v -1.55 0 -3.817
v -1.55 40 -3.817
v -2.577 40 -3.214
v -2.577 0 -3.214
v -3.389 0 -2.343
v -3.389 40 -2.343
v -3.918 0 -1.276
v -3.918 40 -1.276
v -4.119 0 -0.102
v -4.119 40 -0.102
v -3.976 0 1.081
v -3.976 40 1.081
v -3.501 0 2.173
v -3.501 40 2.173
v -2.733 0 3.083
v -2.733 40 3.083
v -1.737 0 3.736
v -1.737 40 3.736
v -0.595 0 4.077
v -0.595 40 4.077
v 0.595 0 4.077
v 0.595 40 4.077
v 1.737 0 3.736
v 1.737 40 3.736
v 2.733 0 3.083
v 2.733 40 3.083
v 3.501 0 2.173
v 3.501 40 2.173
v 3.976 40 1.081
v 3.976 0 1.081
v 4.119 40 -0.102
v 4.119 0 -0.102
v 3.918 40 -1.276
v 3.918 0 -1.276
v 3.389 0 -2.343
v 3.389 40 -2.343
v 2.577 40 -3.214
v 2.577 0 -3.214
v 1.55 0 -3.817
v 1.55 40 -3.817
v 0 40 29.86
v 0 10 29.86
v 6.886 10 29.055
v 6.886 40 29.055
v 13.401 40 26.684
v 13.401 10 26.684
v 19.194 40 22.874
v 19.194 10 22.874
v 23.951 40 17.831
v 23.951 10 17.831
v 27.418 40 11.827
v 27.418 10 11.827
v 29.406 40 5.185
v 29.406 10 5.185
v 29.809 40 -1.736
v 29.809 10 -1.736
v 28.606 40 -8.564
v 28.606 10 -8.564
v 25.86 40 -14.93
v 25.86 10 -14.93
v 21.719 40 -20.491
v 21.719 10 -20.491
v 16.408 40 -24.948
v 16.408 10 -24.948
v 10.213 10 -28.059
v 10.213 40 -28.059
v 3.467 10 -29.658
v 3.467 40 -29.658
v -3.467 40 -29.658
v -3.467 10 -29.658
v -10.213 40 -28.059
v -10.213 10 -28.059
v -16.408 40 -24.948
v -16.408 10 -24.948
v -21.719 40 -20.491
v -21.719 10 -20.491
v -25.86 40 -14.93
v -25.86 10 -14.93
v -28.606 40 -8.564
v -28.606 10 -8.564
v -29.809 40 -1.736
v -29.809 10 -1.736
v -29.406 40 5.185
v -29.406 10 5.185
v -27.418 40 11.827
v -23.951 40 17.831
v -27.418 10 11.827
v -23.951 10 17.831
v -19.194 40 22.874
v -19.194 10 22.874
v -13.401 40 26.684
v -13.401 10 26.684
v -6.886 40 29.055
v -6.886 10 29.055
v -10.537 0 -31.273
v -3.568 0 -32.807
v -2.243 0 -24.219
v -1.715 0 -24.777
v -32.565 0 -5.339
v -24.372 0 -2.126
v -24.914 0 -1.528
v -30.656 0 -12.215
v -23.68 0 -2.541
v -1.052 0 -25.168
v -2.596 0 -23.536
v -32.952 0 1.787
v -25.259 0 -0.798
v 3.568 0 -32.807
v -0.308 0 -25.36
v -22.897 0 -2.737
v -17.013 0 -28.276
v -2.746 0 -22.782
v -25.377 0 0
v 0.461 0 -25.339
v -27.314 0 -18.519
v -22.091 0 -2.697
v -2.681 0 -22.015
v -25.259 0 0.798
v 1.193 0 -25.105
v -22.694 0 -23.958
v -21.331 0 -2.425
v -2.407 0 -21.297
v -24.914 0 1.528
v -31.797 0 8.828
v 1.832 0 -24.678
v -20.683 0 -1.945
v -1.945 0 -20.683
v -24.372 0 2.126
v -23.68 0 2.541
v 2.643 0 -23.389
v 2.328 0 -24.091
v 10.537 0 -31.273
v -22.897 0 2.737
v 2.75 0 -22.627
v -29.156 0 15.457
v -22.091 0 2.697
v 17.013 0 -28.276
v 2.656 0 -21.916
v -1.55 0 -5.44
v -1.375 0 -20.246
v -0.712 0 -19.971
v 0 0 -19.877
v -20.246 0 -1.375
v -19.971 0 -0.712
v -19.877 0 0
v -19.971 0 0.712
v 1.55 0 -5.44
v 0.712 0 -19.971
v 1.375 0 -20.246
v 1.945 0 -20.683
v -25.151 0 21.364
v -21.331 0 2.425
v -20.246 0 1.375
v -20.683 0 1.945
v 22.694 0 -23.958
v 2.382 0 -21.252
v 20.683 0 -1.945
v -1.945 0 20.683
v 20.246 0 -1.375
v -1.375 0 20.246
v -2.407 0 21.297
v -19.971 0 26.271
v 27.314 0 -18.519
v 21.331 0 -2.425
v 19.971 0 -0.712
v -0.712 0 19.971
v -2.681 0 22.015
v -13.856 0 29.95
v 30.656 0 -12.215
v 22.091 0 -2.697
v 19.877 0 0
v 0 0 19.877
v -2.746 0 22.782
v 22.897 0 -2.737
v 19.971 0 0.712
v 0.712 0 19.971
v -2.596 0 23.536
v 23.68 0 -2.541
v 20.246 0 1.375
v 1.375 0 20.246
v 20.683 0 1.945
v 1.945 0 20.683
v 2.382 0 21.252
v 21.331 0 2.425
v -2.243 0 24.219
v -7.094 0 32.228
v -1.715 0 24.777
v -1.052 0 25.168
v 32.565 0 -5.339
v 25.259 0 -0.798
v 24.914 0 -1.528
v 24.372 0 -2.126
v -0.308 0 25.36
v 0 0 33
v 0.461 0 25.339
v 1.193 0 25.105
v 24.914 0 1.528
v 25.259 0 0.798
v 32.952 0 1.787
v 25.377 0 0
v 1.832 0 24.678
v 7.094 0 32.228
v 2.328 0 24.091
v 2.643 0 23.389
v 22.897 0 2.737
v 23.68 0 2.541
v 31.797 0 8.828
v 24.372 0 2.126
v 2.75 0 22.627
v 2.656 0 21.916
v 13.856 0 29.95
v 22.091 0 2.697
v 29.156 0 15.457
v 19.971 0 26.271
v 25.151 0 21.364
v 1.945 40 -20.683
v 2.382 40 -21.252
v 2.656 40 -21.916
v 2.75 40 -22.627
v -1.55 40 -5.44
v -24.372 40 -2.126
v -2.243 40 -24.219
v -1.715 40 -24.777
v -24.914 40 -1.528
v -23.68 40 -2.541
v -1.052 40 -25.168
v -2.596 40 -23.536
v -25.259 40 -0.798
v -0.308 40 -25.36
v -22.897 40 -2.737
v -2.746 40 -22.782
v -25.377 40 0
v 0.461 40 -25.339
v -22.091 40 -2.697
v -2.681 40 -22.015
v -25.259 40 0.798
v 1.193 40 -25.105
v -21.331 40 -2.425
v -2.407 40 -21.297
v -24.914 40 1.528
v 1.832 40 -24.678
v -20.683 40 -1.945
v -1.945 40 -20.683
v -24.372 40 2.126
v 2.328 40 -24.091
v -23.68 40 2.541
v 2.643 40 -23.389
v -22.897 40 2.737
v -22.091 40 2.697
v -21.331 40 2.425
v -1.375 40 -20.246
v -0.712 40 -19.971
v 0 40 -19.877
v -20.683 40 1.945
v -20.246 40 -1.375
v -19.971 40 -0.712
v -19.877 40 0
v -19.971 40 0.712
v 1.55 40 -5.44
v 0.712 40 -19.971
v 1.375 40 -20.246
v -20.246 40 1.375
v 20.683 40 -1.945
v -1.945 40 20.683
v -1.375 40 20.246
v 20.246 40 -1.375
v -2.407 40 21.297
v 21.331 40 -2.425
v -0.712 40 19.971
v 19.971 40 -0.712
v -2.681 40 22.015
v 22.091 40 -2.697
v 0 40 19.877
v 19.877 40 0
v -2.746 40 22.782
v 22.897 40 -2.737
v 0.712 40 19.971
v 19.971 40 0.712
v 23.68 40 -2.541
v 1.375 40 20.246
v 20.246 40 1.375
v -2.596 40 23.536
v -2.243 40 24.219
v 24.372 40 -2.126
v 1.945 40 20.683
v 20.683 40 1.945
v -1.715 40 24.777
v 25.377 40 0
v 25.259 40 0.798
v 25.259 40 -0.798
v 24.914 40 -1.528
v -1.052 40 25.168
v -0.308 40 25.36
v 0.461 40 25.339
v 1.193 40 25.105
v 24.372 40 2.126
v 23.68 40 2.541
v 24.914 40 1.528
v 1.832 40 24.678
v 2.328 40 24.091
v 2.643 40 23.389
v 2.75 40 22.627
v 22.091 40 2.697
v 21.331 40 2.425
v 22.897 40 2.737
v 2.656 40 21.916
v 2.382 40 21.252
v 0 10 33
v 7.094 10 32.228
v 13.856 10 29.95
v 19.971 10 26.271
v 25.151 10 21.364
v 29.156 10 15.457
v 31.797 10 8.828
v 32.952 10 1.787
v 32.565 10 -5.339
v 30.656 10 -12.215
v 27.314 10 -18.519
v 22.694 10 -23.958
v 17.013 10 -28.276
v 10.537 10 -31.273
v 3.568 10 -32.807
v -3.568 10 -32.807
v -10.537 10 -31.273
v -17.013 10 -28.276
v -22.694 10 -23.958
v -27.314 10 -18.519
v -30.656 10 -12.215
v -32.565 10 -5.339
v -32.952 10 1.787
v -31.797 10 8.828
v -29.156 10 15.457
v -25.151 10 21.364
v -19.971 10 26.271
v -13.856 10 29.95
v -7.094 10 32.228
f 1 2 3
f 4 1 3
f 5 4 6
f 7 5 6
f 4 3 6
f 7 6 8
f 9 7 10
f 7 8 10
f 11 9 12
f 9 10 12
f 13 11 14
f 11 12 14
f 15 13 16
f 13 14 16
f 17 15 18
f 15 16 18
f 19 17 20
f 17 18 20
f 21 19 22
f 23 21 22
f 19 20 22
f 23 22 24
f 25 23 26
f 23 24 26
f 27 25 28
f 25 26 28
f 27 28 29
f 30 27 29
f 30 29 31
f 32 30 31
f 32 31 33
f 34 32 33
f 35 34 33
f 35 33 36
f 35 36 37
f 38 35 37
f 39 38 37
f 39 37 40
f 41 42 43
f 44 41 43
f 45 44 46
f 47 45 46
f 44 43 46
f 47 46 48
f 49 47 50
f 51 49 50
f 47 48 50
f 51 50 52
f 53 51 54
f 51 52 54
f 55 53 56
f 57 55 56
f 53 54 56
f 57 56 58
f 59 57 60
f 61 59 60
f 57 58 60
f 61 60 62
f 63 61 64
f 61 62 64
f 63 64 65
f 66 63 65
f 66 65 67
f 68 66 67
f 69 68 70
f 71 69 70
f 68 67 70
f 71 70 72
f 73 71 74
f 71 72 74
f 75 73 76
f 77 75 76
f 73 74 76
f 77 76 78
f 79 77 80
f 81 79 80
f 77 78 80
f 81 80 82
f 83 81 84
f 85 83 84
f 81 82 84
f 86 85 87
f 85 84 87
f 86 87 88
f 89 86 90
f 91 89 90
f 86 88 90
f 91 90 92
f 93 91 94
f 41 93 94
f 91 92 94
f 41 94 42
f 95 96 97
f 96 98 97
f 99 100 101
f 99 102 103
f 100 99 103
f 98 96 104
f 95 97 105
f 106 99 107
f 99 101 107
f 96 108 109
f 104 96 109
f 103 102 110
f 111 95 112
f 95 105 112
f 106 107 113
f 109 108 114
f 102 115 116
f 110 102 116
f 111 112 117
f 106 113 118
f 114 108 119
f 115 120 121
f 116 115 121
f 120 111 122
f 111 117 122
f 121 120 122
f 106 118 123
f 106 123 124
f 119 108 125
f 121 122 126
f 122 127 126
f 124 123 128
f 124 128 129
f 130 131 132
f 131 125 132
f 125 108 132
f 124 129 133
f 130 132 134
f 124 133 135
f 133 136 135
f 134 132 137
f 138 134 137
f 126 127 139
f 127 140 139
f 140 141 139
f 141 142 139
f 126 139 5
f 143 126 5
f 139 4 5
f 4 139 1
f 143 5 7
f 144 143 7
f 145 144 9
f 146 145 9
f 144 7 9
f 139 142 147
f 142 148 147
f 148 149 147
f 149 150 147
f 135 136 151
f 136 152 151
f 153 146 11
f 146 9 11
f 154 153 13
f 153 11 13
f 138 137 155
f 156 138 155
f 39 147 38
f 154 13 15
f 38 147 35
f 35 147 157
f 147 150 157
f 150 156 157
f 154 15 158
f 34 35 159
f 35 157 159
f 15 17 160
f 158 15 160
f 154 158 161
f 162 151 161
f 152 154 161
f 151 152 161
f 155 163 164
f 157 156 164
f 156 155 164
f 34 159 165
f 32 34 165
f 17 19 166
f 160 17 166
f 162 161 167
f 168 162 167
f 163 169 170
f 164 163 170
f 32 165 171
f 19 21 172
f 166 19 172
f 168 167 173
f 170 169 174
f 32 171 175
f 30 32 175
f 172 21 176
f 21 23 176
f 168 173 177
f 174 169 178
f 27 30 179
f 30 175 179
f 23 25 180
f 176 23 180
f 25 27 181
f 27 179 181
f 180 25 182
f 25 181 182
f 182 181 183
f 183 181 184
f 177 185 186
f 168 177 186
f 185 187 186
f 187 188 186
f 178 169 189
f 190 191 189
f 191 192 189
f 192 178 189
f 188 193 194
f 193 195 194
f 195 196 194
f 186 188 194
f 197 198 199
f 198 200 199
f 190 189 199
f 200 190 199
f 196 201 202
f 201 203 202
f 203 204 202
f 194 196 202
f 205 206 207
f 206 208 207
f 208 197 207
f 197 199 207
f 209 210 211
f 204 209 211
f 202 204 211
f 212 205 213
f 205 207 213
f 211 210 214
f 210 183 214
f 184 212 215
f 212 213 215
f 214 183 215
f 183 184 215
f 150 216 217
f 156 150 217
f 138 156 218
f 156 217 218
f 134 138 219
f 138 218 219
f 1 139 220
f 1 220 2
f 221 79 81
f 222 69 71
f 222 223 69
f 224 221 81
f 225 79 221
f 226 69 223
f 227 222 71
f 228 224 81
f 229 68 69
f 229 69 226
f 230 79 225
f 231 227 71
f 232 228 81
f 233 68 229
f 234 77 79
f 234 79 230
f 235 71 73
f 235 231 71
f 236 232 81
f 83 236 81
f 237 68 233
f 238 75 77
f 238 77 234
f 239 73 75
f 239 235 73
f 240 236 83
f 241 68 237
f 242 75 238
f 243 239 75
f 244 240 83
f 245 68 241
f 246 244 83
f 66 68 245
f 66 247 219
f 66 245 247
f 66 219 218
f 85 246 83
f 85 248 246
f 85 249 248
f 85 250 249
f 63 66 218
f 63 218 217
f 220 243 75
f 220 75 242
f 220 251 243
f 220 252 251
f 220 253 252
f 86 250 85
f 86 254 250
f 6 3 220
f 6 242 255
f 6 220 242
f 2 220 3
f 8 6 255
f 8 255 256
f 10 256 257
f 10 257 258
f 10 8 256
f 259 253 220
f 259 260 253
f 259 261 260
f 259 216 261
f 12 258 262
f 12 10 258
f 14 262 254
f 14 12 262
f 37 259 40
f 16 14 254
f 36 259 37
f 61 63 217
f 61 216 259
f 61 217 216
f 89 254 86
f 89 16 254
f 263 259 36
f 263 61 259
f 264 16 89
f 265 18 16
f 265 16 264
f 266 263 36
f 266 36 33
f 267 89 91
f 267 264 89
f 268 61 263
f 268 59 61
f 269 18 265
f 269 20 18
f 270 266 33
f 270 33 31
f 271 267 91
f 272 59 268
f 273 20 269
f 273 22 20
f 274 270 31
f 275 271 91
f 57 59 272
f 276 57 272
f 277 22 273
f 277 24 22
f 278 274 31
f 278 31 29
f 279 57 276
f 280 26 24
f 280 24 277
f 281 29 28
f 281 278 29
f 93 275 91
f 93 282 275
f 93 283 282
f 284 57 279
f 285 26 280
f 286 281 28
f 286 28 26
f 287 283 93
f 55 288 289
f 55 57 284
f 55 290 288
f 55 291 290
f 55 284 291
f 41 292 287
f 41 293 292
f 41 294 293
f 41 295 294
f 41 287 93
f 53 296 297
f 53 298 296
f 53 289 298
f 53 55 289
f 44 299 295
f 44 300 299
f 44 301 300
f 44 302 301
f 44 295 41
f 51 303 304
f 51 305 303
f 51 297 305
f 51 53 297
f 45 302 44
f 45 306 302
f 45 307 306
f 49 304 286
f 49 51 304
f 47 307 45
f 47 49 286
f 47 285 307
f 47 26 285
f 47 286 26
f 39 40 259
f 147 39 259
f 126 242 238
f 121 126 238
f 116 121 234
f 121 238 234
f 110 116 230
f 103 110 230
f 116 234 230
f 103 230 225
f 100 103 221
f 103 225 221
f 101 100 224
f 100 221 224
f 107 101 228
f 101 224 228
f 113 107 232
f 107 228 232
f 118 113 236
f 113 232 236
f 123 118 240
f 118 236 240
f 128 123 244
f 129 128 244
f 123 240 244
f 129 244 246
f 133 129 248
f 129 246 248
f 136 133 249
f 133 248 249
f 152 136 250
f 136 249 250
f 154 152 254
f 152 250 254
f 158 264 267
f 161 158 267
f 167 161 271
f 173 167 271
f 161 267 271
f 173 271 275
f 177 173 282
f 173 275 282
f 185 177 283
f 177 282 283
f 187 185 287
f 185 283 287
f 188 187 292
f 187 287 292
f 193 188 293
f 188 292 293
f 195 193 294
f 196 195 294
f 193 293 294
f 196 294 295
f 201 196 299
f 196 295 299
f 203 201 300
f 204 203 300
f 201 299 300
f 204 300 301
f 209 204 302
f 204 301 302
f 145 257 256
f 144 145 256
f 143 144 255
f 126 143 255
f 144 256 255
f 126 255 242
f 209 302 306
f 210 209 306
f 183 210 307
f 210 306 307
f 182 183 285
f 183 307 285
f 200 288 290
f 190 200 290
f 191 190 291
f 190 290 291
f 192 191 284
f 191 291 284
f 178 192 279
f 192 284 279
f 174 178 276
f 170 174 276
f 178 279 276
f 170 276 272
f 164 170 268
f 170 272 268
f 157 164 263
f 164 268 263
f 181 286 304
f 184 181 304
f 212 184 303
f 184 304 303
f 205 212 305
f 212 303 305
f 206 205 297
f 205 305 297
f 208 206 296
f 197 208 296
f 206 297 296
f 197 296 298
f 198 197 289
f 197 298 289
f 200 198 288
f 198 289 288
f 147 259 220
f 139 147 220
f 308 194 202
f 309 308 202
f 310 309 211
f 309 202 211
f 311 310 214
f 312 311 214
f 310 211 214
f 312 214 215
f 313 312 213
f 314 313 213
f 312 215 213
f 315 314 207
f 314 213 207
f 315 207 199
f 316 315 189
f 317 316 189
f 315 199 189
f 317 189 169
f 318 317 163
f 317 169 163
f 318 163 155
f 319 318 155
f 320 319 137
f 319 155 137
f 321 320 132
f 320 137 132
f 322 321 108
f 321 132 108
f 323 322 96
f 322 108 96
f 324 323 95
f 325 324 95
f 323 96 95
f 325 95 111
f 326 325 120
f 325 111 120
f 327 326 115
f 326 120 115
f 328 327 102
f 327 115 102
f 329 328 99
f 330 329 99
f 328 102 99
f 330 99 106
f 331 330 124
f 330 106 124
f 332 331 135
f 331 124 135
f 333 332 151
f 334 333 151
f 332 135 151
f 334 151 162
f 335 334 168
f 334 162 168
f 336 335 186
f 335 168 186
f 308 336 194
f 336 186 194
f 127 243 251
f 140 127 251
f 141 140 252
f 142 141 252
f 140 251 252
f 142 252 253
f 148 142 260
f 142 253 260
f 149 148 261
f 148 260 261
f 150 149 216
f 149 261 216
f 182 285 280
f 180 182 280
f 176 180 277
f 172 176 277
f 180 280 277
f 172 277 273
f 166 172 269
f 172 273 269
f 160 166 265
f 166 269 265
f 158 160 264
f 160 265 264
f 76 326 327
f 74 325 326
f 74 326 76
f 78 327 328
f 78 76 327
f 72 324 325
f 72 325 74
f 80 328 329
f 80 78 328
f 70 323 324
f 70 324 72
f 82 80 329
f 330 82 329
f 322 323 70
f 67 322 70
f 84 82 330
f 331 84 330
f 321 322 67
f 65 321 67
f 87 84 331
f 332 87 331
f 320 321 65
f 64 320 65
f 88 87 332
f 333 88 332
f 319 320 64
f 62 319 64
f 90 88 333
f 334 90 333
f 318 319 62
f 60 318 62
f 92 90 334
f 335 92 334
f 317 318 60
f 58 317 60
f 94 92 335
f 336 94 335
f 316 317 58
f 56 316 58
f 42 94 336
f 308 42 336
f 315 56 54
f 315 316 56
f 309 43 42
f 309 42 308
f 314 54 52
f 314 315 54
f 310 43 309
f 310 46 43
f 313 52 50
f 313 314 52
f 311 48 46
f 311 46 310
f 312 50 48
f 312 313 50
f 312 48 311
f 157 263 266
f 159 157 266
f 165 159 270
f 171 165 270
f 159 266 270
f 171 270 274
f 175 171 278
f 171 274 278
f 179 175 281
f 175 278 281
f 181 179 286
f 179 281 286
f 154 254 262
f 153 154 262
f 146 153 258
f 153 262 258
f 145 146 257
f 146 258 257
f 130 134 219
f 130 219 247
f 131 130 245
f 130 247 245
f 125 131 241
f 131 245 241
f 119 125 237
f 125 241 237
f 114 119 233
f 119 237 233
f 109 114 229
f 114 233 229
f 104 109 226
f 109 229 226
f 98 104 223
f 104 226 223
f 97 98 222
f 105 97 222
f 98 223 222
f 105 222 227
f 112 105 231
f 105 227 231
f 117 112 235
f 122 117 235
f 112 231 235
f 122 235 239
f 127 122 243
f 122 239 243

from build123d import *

# Parameters (mm, degrees)
SKETCH1_R           = 33
BOSS_EXTRUDE1_DEPTH = 10
SKETCH2_R           = 29.86
BOSS_EXTRUDE2_DEPTH = 30
CUT_EXTRUDE1_DEPTH  = 54
SKETCH4_R           = 4.12
CUT_EXTRUDE2_DEPTH  = 54


with BuildPart() as part:
    # Sketch1 → Boss-Extrude1 (new body)
    with BuildSketch(Plane(origin=(0, 0, 0), x_dir=(1, 0, 0), z_dir=(0, 1, 0))):
        with Locations(Location((0, 0, 0), (0, 0, 270))):
            Circle(SKETCH1_R)
    extrude(amount=BOSS_EXTRUDE1_DEPTH)

    # Sketch2 → Boss-Extrude2 (add)
    with BuildSketch(Plane(origin=(0, 10, 0), x_dir=(1, 0, 0), z_dir=(0, 1, 0))):
        with Locations(Location((0, 0, 0), (0, 0, 270))):
            Circle(SKETCH2_R)
    extrude(amount=BOSS_EXTRUDE2_DEPTH)

    # Sketch3 → Cut-Extrude1 (cut)
    with BuildSketch(Plane(origin=(0, 40, 0), x_dir=(1, 0, 0), z_dir=(0, 1, 0))):
        with BuildLine():
            Line((1.944543648, 20.68287335), (0, 22.627416998))
            Line((0, 22.627416998), (-1.944543648, 20.68287335))
            ThreePointArc((-1.944543648, 20.68287335), (0, 19.877416998), (1.944543648, 20.68287335))
        make_face()
        with BuildLine():
            Line((-1.944543648, 20.68287335), (0, 22.627416998))
            Line((0, 22.627416998), (1.944543648, 20.68287335))
            ThreePointArc((1.944543648, 20.68287335), (2.540668714, 21.575037559), (2.75, 22.627416998))
            ThreePointArc((2.75, 22.627416998), (-1.052379439, 25.168085712), (-1.944543648, 20.68287335))
        make_face()
        with BuildLine():
            ThreePointArc((25.377416998, 0), (23.679796437, 2.540668714), (20.68287335, 1.944543648))
            Line((20.68287335, 1.944543648), (22.627416998, 0))
            Line((22.627416998, 0), (20.68287335, -1.944543648))
            ThreePointArc((20.68287335, -1.944543648), (23.679796437, -2.540668714), (25.377416998, 0))
        make_face()
        with BuildLine():
            Line((22.627416998, 0), (20.68287335, 1.944543648))
            ThreePointArc((20.68287335, 1.944543648), (19.877416998, 0), (20.68287335, -1.944543648))
            Line((20.68287335, -1.944543648), (22.627416998, 0))
        make_face()
        with BuildLine():
            ThreePointArc((1.944543648, -20.68287335), (0, -19.877416998), (-1.944543648, -20.68287335))
            Line((-1.944543648, -20.68287335), (0, -22.627416998))
            Line((0, -22.627416998), (1.944543648, -20.68287335))
        make_face()
        with BuildLine():
            Line((0, -22.627416998), (-1.944543648, -20.68287335))
            ThreePointArc((-1.944543648, -20.68287335), (-1.052379439, -25.168085712), (2.75, -22.627416998))
            ThreePointArc((2.75, -22.627416998), (2.540668714, -21.575037559), (1.944543648, -20.68287335))
            Line((1.944543648, -20.68287335), (0, -22.627416998))
        make_face()
        with BuildLine():
            ThreePointArc((-19.877416998, 0), (-20.086748284, 1.052379439), (-20.68287335, 1.944543648))
            Line((-20.68287335, 1.944543648), (-22.627416998, 0))
            Line((-22.627416998, 0), (-20.68287335, -1.944543648))
            ThreePointArc((-20.68287335, -1.944543648), (-20.086748284, -1.052379439), (-19.877416998, 0))
        make_face()
        with BuildLine():
            Line((-22.627416998, 0), (-20.68287335, 1.944543648))
            ThreePointArc((-20.68287335, 1.944543648), (-25.377416998, 0), (-20.68287335, -1.944543648))
            Line((-20.68287335, -1.944543648), (-22.627416998, 0))
        make_face()
    extrude(amount=-CUT_EXTRUDE1_DEPTH, mode=Mode.SUBTRACT)

    # Sketch4 → Cut-Extrude2 (cut)
    with BuildSketch(Plane(origin=(0, 40, 0), x_dir=(1, 0, 0), z_dir=(0, 1, 0))):
        Circle(SKETCH4_R)
        with BuildLine():
            Line((0, 5.44), (0, 4.12))
            ThreePointArc((0, 4.12), (0.789638797, 4.043620973), (1.55, 3.817315811))
            Line((1.55, 3.817315811), (1.55, 5.44))
            Line((1.55, 5.44), (0, 5.44))
        make_face()
        with BuildLine():
            ThreePointArc((-1.55, 3.817315811), (-0.789638797, 4.043620973), (0, 4.12))
            Line((0, 4.12), (0, 5.44))
            Line((0, 5.44), (-1.55, 5.44))
            Line((-1.55, 5.44), (-1.55, 3.817315811))
        make_face()
    extrude(amount=-CUT_EXTRUDE2_DEPTH, mode=Mode.SUBTRACT)


solid = part.part
